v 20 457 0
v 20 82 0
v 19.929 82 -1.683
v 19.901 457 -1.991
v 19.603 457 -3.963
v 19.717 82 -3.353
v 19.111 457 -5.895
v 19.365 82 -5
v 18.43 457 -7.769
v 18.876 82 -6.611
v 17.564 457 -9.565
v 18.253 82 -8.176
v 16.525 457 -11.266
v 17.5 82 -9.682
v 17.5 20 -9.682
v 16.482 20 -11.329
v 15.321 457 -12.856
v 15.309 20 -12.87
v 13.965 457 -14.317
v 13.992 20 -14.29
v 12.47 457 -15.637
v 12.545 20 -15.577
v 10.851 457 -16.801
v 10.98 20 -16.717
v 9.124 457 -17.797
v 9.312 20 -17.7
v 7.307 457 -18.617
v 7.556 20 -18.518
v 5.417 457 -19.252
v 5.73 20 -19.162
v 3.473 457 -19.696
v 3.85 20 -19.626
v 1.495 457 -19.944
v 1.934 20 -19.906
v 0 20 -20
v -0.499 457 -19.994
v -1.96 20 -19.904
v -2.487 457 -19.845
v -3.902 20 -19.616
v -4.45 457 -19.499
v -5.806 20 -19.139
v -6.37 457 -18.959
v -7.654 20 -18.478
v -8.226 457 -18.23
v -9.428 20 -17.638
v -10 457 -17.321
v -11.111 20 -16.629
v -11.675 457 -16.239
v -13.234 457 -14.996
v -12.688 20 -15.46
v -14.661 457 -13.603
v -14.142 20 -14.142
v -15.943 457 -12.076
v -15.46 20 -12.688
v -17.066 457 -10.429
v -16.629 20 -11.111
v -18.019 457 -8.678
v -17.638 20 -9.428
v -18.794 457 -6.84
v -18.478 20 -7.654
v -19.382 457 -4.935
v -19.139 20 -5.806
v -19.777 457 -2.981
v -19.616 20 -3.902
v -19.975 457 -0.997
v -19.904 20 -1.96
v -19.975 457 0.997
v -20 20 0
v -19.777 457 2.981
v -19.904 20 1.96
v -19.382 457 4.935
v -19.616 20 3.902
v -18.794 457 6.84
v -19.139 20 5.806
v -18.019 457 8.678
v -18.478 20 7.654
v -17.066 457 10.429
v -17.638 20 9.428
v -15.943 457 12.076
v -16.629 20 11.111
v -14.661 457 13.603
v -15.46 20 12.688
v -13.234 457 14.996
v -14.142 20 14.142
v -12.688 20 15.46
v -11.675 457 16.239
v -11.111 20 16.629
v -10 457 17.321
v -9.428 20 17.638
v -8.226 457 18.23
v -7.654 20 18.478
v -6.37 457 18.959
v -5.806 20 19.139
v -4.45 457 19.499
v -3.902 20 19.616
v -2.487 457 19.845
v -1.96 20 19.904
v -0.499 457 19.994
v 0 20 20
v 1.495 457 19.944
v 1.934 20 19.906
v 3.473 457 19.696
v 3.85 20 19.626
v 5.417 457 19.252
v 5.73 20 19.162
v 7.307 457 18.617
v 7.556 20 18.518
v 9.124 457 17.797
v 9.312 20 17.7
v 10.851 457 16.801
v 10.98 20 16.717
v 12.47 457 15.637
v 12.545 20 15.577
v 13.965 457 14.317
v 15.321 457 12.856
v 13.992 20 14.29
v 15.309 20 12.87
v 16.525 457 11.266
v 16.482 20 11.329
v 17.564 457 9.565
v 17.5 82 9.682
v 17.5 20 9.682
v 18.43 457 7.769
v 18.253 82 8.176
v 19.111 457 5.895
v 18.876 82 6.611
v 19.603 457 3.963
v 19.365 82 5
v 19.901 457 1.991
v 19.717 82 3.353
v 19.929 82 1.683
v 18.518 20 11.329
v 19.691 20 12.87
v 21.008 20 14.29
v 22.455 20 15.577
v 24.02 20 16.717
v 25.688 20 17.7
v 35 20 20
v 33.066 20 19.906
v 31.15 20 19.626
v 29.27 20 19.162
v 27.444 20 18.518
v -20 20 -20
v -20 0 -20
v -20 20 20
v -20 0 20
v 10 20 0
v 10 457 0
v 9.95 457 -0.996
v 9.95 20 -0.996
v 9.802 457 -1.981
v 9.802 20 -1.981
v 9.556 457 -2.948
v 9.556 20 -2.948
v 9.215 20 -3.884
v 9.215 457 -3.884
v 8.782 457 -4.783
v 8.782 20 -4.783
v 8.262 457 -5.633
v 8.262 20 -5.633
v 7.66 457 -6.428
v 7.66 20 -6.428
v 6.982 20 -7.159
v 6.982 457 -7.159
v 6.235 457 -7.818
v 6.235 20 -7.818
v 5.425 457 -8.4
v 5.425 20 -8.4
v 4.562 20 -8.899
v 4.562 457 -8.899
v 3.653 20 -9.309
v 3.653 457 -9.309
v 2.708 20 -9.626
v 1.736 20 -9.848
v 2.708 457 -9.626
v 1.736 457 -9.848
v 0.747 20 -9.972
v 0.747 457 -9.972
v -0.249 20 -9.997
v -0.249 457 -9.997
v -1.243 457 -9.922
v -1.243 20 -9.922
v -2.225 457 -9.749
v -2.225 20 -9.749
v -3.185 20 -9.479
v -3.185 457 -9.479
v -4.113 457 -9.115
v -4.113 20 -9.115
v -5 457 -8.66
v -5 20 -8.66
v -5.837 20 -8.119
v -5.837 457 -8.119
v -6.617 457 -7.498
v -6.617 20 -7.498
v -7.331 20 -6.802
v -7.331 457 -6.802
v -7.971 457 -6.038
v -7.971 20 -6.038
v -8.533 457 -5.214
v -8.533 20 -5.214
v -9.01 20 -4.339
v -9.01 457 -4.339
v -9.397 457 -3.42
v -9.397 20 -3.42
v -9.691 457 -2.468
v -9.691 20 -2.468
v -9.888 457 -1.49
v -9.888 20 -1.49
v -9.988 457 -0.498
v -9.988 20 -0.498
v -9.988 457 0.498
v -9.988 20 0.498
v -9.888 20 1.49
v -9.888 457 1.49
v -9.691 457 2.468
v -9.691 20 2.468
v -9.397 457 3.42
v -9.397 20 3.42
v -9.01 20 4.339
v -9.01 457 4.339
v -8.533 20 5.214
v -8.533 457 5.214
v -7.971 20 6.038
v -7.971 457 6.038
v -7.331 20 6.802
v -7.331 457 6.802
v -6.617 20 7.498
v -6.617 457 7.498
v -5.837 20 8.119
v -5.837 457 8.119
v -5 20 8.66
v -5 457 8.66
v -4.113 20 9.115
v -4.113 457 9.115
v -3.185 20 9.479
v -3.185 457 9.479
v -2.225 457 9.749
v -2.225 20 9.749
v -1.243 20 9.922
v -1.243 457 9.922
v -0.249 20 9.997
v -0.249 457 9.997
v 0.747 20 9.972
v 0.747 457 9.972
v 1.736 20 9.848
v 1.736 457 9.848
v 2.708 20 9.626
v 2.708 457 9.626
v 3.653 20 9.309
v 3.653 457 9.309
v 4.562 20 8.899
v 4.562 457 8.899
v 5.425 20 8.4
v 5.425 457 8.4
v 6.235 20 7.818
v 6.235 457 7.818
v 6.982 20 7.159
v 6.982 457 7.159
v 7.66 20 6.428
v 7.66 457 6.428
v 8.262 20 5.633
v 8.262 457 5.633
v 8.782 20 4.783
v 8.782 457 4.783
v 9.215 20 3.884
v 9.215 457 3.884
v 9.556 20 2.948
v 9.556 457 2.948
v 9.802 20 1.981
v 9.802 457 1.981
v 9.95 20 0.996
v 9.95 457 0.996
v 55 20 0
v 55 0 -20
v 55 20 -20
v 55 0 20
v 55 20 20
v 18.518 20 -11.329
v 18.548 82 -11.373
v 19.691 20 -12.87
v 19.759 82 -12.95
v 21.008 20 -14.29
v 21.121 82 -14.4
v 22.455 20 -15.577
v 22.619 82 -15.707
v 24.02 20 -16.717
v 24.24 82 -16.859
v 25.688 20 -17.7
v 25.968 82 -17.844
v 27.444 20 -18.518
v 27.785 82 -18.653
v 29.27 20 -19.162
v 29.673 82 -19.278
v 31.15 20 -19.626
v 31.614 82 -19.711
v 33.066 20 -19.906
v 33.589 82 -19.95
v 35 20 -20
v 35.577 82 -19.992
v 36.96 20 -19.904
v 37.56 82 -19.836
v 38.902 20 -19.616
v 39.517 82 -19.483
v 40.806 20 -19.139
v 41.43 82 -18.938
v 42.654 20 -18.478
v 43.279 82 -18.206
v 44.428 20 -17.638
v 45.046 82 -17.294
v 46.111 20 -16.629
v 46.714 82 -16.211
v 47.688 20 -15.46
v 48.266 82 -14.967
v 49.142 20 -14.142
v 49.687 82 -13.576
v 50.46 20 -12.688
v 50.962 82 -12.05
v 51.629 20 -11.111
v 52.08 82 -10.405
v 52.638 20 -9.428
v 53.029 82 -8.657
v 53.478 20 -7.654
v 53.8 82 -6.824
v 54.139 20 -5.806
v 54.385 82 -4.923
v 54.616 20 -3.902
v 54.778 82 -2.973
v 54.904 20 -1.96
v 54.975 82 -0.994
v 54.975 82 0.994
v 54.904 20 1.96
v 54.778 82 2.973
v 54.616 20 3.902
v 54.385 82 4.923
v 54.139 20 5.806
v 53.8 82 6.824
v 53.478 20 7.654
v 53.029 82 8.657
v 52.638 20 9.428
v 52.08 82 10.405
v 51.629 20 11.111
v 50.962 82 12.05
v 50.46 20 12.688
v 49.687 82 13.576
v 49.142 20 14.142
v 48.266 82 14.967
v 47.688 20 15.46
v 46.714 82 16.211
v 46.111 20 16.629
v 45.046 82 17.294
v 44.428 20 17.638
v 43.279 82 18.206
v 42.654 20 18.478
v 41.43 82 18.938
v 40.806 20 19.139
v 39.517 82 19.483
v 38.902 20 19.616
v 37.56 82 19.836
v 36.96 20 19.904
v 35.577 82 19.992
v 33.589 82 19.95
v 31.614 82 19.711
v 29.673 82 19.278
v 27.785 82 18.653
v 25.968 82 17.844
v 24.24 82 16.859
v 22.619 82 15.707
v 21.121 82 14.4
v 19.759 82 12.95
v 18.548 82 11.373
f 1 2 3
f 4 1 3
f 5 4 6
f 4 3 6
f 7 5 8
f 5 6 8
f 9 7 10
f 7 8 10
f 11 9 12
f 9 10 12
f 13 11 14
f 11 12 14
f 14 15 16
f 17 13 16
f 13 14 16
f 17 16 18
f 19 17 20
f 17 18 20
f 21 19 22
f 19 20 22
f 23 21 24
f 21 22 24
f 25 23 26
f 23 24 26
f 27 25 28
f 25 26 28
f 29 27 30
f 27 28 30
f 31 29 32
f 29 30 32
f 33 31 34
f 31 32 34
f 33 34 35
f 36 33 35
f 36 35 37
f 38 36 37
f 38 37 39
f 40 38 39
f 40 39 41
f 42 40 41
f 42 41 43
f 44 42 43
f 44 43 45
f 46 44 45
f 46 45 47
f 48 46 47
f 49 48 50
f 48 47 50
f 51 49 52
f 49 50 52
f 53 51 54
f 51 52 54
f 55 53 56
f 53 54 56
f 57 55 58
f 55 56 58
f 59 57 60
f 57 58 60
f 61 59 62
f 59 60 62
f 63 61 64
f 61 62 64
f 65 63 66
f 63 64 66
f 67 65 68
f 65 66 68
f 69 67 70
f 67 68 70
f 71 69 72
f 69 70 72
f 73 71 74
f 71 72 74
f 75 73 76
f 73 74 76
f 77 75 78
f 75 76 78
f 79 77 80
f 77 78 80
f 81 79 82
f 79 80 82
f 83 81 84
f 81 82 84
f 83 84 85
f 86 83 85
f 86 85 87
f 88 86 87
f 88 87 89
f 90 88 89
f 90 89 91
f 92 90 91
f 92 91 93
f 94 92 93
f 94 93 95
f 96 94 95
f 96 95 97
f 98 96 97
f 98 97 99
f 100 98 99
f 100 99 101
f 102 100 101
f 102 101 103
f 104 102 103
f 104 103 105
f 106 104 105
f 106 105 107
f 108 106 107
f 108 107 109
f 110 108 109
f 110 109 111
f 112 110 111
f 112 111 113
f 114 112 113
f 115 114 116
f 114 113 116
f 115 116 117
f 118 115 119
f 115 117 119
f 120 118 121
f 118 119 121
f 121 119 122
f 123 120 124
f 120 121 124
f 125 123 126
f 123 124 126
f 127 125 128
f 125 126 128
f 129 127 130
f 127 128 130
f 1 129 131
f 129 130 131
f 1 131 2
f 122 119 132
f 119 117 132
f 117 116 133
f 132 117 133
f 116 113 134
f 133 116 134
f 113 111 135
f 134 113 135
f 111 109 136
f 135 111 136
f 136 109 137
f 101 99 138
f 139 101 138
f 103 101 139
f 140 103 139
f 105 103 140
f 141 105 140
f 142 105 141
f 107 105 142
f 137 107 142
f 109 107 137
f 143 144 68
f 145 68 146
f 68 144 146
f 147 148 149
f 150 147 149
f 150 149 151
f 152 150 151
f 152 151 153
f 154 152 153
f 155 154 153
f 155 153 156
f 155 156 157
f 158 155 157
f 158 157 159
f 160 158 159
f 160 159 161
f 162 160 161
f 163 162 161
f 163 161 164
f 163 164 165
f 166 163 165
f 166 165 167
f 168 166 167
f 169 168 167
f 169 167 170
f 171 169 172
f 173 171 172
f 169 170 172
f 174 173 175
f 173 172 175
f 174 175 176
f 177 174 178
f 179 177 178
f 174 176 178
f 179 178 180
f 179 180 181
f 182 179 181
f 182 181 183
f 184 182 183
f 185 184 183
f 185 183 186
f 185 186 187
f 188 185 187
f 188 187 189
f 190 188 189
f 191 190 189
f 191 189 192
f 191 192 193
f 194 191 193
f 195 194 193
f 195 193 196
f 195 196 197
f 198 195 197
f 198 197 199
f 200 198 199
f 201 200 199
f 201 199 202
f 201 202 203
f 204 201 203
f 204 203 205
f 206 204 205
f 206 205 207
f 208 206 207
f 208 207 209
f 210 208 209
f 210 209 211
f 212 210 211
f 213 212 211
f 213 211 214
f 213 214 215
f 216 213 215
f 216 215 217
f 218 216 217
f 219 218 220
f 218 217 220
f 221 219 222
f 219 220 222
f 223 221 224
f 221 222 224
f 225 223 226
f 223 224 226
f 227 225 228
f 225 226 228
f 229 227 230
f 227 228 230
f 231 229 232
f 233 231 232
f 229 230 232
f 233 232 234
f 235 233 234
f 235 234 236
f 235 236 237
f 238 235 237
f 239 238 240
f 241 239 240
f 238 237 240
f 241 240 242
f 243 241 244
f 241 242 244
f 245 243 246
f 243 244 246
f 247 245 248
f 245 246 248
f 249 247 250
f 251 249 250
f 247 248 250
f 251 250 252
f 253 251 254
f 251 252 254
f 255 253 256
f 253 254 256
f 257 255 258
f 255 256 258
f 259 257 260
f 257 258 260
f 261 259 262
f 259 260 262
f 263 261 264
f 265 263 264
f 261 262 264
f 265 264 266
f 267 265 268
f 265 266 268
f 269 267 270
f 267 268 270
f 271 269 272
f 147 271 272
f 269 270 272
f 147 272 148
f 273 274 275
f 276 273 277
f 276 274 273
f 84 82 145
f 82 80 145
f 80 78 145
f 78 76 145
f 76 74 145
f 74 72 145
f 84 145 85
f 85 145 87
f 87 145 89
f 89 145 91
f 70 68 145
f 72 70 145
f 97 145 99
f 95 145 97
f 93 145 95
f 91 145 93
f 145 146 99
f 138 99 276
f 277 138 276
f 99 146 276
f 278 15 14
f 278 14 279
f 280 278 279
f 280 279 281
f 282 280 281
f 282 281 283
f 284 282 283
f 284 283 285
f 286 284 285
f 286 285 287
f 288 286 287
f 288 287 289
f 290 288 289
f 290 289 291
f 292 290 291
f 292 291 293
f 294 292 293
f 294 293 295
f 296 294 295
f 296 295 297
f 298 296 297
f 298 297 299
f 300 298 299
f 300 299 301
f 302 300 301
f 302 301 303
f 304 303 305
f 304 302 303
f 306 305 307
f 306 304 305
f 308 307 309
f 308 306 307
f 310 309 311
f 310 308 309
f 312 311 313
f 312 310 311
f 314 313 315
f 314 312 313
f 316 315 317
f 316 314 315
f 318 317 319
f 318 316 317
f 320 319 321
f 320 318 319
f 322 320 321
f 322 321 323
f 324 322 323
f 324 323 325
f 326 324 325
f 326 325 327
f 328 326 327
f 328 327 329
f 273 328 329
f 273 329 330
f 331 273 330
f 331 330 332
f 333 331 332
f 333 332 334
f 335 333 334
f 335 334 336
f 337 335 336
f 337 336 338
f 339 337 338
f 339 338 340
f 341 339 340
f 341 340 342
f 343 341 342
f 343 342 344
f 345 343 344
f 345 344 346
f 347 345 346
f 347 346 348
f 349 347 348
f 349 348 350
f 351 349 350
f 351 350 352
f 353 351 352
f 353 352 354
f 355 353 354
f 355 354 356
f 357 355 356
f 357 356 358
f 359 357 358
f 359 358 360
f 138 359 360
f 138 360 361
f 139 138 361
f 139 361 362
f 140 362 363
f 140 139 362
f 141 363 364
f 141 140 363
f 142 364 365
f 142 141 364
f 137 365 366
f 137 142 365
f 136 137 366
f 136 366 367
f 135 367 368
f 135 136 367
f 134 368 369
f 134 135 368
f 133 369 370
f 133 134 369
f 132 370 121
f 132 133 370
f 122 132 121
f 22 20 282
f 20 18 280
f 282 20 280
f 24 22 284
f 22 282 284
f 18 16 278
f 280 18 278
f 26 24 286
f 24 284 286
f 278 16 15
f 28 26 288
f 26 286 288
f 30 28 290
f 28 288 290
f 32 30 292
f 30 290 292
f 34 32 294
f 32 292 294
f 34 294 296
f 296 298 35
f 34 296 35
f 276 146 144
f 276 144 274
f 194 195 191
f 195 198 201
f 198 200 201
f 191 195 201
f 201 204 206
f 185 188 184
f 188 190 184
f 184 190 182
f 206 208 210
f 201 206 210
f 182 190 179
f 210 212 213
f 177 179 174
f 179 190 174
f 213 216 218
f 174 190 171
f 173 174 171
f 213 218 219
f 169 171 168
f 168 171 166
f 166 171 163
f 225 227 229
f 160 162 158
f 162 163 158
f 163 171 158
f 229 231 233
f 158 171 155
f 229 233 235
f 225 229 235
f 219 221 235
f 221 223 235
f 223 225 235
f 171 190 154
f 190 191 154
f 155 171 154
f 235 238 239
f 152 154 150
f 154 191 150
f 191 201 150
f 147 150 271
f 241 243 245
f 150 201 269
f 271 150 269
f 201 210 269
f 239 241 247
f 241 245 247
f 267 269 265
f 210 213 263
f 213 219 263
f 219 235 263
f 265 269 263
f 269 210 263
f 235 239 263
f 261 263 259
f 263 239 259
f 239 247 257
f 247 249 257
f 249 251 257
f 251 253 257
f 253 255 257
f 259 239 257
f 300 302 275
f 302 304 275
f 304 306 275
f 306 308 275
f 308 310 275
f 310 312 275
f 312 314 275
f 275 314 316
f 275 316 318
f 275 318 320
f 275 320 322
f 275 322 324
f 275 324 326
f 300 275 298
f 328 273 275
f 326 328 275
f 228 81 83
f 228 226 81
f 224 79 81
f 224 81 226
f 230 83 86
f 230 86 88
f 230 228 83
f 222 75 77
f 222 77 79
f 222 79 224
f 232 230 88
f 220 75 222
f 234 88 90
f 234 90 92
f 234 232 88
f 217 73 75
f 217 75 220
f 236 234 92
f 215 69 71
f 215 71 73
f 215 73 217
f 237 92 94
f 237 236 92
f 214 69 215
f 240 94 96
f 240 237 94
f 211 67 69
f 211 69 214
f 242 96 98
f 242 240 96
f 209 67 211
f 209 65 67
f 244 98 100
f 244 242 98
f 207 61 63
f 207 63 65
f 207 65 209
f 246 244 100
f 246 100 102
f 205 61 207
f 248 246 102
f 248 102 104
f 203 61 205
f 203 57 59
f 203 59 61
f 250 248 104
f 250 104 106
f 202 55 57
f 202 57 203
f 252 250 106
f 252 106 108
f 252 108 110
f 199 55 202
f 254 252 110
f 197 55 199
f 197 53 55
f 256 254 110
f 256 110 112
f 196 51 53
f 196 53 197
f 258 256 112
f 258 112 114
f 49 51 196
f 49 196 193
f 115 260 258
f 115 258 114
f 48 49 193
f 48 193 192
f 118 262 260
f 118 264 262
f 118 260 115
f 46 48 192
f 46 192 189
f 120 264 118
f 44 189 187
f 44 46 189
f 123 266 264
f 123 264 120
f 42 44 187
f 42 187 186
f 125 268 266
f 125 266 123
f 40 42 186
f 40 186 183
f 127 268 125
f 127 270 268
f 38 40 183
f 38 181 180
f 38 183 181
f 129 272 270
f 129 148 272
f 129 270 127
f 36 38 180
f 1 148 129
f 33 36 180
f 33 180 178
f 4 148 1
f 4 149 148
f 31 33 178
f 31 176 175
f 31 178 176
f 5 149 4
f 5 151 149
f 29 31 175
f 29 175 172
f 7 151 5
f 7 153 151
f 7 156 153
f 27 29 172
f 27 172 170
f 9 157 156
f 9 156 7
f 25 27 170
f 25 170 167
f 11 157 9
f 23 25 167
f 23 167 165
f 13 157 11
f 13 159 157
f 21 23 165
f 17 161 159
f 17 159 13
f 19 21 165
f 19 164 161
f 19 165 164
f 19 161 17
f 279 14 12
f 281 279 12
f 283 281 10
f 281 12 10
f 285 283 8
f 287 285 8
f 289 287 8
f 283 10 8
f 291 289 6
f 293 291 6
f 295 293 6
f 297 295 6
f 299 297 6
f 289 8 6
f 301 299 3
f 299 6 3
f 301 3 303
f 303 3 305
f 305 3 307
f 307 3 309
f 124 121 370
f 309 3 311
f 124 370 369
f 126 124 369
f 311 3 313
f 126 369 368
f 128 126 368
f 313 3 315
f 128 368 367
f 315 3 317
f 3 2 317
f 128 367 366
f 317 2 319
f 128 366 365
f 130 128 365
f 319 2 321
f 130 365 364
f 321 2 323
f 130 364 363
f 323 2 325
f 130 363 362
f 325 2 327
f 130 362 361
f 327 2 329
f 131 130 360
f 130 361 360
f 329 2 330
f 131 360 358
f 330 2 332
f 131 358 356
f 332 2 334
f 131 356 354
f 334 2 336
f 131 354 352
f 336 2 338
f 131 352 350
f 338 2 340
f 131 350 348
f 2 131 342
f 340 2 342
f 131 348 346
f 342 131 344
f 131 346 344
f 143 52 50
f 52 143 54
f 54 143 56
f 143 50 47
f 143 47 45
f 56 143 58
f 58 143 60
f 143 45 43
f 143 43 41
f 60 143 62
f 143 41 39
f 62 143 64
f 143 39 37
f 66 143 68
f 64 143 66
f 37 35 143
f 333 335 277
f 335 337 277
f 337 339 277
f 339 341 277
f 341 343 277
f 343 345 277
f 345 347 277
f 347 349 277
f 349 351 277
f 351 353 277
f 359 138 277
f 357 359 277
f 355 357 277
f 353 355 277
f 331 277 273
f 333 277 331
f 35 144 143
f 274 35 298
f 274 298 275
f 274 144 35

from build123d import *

# Parameters (mm, degrees)
SKETCH1_R           = 20
BOSS_EXTRUDE1_DEPTH = 457
SKETCH2_R           = 10
CUT_EXTRUDE1_DEPTH  = 526
SKETCH6_R           = 20
BOSS_EXTRUDE4_DEPTH = 82
SKETCH7_W           = 75
SKETCH7_H           = 40
BOSS_EXTRUDE5_DEPTH = 20


with BuildPart() as part:
    # Sketch1 → Boss-Extrude1 (new body)
    with BuildSketch(Plane(origin=(0, 0, 0), x_dir=(1, 0, 0), z_dir=(0, 1, 0))):
        Circle(SKETCH1_R)
    extrude(amount=BOSS_EXTRUDE1_DEPTH)

    # Sketch2 → Cut-Extrude1 (cut)
    with BuildSketch(Plane(origin=(0, 457, 0), x_dir=(1, 0, 0), z_dir=(0, 1, 0))):
        Circle(SKETCH2_R)
    extrude(amount=-CUT_EXTRUDE1_DEPTH, mode=Mode.SUBTRACT)

    # Sketch6 → Boss-Extrude4 (add)
    with BuildSketch(Plane.XZ):
        with Locations((35, 0)):
            Circle(SKETCH6_R)
    extrude(amount=-BOSS_EXTRUDE4_DEPTH)

    # Sketch7 → Boss-Extrude5 (add)
    with BuildSketch(Plane.XZ):
        with Locations((17.5, 0)):
            Rectangle(SKETCH7_W, SKETCH7_H)
    extrude(amount=-BOSS_EXTRUDE5_DEPTH)


solid = part.part
